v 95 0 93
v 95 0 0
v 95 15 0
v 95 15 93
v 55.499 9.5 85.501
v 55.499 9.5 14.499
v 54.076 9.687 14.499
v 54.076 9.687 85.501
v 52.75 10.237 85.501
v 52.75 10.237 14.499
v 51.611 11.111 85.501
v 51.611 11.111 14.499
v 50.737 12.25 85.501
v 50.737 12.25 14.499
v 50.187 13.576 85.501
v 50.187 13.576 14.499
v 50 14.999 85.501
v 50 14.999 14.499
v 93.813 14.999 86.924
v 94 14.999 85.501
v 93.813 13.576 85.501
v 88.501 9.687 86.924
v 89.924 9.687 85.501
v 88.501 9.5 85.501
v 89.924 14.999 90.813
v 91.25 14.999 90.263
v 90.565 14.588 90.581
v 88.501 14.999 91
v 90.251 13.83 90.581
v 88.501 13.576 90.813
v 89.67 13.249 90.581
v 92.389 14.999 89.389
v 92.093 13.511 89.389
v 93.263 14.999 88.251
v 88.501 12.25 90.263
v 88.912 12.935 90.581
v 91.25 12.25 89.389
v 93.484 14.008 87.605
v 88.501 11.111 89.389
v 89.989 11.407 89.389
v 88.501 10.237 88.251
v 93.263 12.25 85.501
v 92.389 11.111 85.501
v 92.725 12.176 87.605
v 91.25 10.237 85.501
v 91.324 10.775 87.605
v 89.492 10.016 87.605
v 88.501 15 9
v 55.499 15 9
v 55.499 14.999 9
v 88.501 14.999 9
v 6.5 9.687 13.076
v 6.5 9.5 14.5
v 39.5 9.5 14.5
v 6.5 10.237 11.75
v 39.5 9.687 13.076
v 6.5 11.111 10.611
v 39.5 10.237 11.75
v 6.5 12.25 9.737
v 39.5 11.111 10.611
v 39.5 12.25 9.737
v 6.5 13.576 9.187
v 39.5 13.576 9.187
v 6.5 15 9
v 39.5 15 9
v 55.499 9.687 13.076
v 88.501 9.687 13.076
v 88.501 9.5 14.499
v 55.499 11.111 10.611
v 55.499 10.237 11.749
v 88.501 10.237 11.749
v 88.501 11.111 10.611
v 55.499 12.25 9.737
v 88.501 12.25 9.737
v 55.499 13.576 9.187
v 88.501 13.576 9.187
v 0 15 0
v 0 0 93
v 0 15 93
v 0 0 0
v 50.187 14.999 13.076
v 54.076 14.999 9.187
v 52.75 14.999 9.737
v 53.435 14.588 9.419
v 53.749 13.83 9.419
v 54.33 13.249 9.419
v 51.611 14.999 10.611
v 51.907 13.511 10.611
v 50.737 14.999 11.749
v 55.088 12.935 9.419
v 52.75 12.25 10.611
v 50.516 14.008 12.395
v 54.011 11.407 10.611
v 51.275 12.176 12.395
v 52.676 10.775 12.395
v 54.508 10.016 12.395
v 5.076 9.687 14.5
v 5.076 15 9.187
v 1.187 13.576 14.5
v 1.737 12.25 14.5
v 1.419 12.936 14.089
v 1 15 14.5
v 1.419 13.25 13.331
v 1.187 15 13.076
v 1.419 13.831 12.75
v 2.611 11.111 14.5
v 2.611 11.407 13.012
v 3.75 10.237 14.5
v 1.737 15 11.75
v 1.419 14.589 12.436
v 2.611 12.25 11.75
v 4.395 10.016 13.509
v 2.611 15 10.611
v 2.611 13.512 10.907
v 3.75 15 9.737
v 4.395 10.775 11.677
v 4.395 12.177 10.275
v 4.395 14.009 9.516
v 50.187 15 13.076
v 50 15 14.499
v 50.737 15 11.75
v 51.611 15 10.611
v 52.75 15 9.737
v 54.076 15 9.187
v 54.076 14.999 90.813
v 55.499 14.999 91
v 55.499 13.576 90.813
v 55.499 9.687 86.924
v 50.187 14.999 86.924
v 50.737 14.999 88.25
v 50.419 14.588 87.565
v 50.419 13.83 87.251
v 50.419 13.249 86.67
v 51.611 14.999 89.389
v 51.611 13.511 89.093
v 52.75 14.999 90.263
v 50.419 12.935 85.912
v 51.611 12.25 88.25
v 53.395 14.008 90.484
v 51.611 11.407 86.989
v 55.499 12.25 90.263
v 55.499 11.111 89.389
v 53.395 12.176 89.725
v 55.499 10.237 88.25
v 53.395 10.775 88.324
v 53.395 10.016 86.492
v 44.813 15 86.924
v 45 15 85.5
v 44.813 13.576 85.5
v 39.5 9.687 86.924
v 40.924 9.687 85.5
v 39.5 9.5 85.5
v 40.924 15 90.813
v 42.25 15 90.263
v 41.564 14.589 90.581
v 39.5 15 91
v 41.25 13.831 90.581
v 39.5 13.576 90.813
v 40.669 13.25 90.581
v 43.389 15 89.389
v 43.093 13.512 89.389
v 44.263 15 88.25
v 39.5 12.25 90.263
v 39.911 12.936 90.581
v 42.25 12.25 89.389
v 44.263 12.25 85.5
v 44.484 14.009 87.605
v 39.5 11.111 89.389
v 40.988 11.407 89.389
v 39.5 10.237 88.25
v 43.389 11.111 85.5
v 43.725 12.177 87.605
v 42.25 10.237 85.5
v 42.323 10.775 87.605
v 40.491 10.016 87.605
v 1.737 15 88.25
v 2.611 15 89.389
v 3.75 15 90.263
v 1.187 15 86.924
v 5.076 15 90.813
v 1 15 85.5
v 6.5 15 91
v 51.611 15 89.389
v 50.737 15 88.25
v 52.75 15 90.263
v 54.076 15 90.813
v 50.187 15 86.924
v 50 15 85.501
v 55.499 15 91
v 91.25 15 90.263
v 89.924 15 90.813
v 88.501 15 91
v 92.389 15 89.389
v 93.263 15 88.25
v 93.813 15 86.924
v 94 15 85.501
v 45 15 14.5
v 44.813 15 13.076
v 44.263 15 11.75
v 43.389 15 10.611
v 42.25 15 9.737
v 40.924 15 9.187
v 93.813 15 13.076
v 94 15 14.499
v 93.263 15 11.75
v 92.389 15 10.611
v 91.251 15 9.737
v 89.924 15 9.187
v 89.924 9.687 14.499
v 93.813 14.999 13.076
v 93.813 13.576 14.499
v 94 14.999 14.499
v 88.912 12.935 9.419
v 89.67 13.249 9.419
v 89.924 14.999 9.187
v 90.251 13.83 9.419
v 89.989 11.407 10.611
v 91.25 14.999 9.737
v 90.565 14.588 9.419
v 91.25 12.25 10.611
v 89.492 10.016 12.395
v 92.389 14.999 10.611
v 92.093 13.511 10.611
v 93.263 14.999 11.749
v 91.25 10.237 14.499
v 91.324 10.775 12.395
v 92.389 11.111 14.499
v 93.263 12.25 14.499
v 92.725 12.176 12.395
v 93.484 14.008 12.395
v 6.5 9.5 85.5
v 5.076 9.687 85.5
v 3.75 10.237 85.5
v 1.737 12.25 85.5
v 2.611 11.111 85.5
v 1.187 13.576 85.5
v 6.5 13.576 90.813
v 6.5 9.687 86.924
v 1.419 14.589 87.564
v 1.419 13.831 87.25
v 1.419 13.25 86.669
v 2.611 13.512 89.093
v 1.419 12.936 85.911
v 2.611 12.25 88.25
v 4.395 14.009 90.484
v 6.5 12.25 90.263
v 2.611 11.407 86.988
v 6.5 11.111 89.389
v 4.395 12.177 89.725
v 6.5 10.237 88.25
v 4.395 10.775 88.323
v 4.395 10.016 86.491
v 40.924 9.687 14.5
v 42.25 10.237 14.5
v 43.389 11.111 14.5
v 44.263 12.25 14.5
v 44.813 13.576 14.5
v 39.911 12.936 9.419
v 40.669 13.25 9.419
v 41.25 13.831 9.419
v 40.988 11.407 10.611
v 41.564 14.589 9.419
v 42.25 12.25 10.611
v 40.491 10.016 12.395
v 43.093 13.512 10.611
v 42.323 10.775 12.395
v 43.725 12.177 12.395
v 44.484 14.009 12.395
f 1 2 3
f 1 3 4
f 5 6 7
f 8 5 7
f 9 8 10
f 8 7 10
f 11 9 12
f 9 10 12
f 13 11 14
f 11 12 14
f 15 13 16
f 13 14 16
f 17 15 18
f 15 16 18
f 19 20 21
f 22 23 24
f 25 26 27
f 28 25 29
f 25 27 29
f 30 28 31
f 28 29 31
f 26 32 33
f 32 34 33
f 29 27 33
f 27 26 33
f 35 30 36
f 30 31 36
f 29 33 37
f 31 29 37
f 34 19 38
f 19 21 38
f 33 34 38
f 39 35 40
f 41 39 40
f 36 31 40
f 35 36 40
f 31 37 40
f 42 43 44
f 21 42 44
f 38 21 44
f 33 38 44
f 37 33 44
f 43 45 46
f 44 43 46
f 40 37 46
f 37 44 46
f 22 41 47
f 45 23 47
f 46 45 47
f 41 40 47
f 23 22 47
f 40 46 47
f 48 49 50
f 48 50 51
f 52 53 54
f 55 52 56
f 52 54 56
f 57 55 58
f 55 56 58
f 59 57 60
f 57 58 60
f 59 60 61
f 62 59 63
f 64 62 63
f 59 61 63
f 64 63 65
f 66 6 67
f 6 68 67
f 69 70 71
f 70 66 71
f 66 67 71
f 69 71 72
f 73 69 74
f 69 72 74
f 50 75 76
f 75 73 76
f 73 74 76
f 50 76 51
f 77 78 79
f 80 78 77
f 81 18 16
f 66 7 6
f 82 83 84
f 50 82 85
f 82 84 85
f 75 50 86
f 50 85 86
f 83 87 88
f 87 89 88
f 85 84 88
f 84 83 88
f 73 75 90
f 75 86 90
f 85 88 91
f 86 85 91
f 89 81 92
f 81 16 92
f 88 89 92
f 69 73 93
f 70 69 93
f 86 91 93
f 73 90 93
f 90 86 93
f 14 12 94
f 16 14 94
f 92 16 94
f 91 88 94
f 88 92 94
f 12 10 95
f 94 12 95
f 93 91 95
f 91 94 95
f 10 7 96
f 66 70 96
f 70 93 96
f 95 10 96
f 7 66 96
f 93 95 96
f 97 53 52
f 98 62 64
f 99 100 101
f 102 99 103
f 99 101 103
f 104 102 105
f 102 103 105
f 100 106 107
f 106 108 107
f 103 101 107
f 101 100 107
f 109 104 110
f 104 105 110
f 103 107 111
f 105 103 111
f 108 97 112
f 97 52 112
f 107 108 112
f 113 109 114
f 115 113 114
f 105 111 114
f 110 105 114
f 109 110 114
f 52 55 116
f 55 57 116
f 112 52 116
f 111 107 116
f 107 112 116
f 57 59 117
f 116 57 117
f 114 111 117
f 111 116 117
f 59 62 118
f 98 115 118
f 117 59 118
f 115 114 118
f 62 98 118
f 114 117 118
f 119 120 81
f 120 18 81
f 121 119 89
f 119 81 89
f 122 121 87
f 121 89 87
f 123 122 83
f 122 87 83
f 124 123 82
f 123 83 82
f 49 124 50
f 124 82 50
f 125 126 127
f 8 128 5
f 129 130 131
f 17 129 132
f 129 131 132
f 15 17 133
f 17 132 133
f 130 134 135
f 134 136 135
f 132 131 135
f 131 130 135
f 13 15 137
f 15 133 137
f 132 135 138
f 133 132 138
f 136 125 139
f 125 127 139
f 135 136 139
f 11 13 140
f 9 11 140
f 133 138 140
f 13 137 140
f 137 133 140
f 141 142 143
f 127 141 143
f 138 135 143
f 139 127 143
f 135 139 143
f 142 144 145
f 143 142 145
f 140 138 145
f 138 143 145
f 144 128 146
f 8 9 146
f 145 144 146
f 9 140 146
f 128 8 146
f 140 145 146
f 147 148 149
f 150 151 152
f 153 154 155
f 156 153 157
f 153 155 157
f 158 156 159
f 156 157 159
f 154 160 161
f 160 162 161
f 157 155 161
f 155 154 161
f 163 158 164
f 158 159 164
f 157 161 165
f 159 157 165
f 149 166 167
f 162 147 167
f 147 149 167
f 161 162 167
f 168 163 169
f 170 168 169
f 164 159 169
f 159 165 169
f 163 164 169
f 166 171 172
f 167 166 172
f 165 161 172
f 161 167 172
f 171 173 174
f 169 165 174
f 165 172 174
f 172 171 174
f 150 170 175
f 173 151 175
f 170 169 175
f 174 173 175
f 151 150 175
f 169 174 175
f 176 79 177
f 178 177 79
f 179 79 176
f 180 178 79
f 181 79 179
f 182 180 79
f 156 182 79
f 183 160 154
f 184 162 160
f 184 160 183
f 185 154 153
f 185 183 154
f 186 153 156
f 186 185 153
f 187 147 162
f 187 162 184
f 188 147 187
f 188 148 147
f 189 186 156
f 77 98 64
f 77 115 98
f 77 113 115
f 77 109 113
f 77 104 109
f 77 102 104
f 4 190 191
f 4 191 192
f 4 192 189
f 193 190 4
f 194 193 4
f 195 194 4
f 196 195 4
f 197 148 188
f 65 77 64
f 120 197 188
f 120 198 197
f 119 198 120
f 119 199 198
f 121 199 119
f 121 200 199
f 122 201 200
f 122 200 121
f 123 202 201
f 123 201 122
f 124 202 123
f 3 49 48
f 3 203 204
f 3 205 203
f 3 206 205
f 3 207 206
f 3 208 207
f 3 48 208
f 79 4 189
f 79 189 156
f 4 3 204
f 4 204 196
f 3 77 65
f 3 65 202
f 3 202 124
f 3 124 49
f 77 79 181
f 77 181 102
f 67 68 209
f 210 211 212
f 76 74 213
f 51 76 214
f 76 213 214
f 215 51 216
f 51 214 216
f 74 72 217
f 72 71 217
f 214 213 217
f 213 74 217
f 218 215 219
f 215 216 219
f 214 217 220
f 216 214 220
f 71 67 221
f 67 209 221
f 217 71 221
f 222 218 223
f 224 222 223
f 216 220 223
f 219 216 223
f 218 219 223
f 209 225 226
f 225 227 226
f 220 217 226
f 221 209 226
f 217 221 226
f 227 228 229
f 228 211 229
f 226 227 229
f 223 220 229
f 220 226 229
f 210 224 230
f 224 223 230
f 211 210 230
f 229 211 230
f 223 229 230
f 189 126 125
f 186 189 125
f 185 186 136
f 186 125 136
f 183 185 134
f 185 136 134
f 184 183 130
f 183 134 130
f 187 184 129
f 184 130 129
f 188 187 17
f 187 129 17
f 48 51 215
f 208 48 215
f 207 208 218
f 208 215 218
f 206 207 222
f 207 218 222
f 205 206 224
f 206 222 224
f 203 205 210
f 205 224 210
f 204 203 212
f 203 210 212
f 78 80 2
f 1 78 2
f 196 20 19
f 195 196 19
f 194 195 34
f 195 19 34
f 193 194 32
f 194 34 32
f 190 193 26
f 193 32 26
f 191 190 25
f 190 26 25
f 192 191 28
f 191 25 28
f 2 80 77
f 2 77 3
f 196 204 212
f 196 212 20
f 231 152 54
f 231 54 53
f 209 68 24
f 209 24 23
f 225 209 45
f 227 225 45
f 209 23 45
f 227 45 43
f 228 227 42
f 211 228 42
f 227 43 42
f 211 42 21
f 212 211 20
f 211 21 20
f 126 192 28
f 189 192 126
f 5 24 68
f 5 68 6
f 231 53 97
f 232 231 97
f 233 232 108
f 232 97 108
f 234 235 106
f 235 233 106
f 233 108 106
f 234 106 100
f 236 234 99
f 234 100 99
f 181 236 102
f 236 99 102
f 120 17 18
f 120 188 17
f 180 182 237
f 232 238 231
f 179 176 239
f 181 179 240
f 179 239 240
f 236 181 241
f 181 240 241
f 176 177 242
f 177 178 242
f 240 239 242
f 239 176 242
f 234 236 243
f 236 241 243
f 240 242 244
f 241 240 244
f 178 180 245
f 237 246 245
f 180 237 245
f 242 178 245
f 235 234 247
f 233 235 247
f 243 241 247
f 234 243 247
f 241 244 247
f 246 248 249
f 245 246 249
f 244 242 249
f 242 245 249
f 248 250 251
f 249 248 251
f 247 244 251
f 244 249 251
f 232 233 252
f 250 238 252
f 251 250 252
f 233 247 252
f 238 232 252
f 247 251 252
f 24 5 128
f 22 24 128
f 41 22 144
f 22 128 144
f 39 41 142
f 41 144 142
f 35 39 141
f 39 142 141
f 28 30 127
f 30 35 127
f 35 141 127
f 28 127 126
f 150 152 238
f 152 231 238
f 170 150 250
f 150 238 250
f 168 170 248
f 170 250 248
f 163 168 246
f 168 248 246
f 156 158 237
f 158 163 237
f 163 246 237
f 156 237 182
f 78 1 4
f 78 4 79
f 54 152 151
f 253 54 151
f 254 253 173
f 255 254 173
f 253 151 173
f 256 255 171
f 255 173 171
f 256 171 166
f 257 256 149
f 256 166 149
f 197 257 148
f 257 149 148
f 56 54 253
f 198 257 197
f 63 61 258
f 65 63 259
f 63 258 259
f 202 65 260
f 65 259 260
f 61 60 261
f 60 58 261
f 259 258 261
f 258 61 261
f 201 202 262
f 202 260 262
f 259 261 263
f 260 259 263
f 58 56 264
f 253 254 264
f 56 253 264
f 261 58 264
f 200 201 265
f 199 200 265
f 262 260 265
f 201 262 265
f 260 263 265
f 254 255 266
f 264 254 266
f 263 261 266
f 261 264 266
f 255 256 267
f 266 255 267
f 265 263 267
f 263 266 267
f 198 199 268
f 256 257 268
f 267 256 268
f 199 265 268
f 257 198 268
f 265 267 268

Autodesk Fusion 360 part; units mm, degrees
sketch "Esboço1" plane through (0, 0, 0) normal (0, 1, 0) x (1, 0, 0)
  line L0 (0, 0) -> (95, 0)
  line L1 (95, 0) -> (95, -93)
  line L2 (95, -93) -> (0, -93)
  line L3 (0, -93) -> (0, 0)
  dimension "d1" = 95
  dimension "d2" = 93
extrude "Extrusão1" add sketch "Esboço1" along normal blind 15
sketch "Esboço2" plane through (0, 15, 0) normal (0, 1, 0) x (-1, 0, 0)
  line L0 (0, 93) -> (-95, 93)
  line L1 (-95, 93) -> (-95, 0)
  line L2 (-95, 0) -> (0, 0)
  line L3 (0, 0) -> (0, 93)
  line L4 (-94, 91) -> (-50, 91)
  line L5 (-50, 91) -> (-50, 9)
  line L6 (-50, 9) -> (-94, 9)
  line L7 (-94, 9) -> (-94, 91)
  line L8 (-45, 91) -> (-1, 91)
  line L9 (-1, 91) -> (-1, 9)
  line L10 (-1, 9) -> (-45, 9)
  line L11 (-45, 9) -> (-45, 91)
  dimension "d10" = 44
  dimension "d11" = 82
  dimension "d12" = 44
  dimension "d13" = 82
  dimension "d14" = 1
  dimension "d15" = 1
  dimension "d16" = 5
extrude "Extrusão2" cut sketch "Esboço2" against normal blind 5.5 contours L4 L5 L6 L7 | L8 L9 L10 L11
fillet "Arredondamento2" radius 5.499 8 edges at (94, 9.5, 50) (72, 9.5, 91) (50, 9.5, 50) (72, 9.5, 9) (50, 12.25, 91) (94, 12.25, 91) (94, 12.25, 9) (50, 12.25, 9)
fillet "Arredondamento3" radius 5.4999 8 edges at (45, 9.5, 50) (23, 9.5, 9) (45, 12.25, 9) (45, 12.25, 91) (23, 9.5, 91) (1, 12.25, 91) (1, 9.5, 50) (1, 12.25, 9)
sketch "Esboço3" plane through (0, 9.5, 0) normal (0, 1, 0) x (-1, 0, 0)
  line L0 (-55.499, 14.499) -> (-55.499, 85.501)
  line L1 (-55.499, 85.501) -> (-88.501, 85.501)
  line L2 (-88.501, 85.501) -> (-88.501, 14.499)
  line L3 (-88.501, 14.499) -> (-55.499, 14.499)
  line L4 (-88.501, 14.499) -> (-93.501, 9.499)
  line L5 (-88.501, 14.499) -> (-80.8219, 14.499) construction
  line L6 (-93.501, 9.499) -> (-88.501, 9.499)
  line L7 (-88.501, 14.499) -> (-93.501, 14.499)
  line L8 (-93.501, 14.499) -> (-95, 14.499)
  line L9 (-89.7081, 13.999) -> (-93.8546, 9.8526)
  line L10 (-89.7081, 13.999) -> (-93.501, 13.999)
  line L11 (-93.501, 13.999) -> (-95, 13.999)
  line L12 (-93.501, 9.199) -> (-88.501, 9.199)
  line L13 (-93.8546, 9.8526) -> (-94.5081, 9.199)
  line L14 (-94.5081, 9.199) -> (-93.501, 9.199)
  dimension "d21" = 135
  dimension "d22" = 5
  dimension "d23" = -0.5
  dimension "d24" = 0.3
